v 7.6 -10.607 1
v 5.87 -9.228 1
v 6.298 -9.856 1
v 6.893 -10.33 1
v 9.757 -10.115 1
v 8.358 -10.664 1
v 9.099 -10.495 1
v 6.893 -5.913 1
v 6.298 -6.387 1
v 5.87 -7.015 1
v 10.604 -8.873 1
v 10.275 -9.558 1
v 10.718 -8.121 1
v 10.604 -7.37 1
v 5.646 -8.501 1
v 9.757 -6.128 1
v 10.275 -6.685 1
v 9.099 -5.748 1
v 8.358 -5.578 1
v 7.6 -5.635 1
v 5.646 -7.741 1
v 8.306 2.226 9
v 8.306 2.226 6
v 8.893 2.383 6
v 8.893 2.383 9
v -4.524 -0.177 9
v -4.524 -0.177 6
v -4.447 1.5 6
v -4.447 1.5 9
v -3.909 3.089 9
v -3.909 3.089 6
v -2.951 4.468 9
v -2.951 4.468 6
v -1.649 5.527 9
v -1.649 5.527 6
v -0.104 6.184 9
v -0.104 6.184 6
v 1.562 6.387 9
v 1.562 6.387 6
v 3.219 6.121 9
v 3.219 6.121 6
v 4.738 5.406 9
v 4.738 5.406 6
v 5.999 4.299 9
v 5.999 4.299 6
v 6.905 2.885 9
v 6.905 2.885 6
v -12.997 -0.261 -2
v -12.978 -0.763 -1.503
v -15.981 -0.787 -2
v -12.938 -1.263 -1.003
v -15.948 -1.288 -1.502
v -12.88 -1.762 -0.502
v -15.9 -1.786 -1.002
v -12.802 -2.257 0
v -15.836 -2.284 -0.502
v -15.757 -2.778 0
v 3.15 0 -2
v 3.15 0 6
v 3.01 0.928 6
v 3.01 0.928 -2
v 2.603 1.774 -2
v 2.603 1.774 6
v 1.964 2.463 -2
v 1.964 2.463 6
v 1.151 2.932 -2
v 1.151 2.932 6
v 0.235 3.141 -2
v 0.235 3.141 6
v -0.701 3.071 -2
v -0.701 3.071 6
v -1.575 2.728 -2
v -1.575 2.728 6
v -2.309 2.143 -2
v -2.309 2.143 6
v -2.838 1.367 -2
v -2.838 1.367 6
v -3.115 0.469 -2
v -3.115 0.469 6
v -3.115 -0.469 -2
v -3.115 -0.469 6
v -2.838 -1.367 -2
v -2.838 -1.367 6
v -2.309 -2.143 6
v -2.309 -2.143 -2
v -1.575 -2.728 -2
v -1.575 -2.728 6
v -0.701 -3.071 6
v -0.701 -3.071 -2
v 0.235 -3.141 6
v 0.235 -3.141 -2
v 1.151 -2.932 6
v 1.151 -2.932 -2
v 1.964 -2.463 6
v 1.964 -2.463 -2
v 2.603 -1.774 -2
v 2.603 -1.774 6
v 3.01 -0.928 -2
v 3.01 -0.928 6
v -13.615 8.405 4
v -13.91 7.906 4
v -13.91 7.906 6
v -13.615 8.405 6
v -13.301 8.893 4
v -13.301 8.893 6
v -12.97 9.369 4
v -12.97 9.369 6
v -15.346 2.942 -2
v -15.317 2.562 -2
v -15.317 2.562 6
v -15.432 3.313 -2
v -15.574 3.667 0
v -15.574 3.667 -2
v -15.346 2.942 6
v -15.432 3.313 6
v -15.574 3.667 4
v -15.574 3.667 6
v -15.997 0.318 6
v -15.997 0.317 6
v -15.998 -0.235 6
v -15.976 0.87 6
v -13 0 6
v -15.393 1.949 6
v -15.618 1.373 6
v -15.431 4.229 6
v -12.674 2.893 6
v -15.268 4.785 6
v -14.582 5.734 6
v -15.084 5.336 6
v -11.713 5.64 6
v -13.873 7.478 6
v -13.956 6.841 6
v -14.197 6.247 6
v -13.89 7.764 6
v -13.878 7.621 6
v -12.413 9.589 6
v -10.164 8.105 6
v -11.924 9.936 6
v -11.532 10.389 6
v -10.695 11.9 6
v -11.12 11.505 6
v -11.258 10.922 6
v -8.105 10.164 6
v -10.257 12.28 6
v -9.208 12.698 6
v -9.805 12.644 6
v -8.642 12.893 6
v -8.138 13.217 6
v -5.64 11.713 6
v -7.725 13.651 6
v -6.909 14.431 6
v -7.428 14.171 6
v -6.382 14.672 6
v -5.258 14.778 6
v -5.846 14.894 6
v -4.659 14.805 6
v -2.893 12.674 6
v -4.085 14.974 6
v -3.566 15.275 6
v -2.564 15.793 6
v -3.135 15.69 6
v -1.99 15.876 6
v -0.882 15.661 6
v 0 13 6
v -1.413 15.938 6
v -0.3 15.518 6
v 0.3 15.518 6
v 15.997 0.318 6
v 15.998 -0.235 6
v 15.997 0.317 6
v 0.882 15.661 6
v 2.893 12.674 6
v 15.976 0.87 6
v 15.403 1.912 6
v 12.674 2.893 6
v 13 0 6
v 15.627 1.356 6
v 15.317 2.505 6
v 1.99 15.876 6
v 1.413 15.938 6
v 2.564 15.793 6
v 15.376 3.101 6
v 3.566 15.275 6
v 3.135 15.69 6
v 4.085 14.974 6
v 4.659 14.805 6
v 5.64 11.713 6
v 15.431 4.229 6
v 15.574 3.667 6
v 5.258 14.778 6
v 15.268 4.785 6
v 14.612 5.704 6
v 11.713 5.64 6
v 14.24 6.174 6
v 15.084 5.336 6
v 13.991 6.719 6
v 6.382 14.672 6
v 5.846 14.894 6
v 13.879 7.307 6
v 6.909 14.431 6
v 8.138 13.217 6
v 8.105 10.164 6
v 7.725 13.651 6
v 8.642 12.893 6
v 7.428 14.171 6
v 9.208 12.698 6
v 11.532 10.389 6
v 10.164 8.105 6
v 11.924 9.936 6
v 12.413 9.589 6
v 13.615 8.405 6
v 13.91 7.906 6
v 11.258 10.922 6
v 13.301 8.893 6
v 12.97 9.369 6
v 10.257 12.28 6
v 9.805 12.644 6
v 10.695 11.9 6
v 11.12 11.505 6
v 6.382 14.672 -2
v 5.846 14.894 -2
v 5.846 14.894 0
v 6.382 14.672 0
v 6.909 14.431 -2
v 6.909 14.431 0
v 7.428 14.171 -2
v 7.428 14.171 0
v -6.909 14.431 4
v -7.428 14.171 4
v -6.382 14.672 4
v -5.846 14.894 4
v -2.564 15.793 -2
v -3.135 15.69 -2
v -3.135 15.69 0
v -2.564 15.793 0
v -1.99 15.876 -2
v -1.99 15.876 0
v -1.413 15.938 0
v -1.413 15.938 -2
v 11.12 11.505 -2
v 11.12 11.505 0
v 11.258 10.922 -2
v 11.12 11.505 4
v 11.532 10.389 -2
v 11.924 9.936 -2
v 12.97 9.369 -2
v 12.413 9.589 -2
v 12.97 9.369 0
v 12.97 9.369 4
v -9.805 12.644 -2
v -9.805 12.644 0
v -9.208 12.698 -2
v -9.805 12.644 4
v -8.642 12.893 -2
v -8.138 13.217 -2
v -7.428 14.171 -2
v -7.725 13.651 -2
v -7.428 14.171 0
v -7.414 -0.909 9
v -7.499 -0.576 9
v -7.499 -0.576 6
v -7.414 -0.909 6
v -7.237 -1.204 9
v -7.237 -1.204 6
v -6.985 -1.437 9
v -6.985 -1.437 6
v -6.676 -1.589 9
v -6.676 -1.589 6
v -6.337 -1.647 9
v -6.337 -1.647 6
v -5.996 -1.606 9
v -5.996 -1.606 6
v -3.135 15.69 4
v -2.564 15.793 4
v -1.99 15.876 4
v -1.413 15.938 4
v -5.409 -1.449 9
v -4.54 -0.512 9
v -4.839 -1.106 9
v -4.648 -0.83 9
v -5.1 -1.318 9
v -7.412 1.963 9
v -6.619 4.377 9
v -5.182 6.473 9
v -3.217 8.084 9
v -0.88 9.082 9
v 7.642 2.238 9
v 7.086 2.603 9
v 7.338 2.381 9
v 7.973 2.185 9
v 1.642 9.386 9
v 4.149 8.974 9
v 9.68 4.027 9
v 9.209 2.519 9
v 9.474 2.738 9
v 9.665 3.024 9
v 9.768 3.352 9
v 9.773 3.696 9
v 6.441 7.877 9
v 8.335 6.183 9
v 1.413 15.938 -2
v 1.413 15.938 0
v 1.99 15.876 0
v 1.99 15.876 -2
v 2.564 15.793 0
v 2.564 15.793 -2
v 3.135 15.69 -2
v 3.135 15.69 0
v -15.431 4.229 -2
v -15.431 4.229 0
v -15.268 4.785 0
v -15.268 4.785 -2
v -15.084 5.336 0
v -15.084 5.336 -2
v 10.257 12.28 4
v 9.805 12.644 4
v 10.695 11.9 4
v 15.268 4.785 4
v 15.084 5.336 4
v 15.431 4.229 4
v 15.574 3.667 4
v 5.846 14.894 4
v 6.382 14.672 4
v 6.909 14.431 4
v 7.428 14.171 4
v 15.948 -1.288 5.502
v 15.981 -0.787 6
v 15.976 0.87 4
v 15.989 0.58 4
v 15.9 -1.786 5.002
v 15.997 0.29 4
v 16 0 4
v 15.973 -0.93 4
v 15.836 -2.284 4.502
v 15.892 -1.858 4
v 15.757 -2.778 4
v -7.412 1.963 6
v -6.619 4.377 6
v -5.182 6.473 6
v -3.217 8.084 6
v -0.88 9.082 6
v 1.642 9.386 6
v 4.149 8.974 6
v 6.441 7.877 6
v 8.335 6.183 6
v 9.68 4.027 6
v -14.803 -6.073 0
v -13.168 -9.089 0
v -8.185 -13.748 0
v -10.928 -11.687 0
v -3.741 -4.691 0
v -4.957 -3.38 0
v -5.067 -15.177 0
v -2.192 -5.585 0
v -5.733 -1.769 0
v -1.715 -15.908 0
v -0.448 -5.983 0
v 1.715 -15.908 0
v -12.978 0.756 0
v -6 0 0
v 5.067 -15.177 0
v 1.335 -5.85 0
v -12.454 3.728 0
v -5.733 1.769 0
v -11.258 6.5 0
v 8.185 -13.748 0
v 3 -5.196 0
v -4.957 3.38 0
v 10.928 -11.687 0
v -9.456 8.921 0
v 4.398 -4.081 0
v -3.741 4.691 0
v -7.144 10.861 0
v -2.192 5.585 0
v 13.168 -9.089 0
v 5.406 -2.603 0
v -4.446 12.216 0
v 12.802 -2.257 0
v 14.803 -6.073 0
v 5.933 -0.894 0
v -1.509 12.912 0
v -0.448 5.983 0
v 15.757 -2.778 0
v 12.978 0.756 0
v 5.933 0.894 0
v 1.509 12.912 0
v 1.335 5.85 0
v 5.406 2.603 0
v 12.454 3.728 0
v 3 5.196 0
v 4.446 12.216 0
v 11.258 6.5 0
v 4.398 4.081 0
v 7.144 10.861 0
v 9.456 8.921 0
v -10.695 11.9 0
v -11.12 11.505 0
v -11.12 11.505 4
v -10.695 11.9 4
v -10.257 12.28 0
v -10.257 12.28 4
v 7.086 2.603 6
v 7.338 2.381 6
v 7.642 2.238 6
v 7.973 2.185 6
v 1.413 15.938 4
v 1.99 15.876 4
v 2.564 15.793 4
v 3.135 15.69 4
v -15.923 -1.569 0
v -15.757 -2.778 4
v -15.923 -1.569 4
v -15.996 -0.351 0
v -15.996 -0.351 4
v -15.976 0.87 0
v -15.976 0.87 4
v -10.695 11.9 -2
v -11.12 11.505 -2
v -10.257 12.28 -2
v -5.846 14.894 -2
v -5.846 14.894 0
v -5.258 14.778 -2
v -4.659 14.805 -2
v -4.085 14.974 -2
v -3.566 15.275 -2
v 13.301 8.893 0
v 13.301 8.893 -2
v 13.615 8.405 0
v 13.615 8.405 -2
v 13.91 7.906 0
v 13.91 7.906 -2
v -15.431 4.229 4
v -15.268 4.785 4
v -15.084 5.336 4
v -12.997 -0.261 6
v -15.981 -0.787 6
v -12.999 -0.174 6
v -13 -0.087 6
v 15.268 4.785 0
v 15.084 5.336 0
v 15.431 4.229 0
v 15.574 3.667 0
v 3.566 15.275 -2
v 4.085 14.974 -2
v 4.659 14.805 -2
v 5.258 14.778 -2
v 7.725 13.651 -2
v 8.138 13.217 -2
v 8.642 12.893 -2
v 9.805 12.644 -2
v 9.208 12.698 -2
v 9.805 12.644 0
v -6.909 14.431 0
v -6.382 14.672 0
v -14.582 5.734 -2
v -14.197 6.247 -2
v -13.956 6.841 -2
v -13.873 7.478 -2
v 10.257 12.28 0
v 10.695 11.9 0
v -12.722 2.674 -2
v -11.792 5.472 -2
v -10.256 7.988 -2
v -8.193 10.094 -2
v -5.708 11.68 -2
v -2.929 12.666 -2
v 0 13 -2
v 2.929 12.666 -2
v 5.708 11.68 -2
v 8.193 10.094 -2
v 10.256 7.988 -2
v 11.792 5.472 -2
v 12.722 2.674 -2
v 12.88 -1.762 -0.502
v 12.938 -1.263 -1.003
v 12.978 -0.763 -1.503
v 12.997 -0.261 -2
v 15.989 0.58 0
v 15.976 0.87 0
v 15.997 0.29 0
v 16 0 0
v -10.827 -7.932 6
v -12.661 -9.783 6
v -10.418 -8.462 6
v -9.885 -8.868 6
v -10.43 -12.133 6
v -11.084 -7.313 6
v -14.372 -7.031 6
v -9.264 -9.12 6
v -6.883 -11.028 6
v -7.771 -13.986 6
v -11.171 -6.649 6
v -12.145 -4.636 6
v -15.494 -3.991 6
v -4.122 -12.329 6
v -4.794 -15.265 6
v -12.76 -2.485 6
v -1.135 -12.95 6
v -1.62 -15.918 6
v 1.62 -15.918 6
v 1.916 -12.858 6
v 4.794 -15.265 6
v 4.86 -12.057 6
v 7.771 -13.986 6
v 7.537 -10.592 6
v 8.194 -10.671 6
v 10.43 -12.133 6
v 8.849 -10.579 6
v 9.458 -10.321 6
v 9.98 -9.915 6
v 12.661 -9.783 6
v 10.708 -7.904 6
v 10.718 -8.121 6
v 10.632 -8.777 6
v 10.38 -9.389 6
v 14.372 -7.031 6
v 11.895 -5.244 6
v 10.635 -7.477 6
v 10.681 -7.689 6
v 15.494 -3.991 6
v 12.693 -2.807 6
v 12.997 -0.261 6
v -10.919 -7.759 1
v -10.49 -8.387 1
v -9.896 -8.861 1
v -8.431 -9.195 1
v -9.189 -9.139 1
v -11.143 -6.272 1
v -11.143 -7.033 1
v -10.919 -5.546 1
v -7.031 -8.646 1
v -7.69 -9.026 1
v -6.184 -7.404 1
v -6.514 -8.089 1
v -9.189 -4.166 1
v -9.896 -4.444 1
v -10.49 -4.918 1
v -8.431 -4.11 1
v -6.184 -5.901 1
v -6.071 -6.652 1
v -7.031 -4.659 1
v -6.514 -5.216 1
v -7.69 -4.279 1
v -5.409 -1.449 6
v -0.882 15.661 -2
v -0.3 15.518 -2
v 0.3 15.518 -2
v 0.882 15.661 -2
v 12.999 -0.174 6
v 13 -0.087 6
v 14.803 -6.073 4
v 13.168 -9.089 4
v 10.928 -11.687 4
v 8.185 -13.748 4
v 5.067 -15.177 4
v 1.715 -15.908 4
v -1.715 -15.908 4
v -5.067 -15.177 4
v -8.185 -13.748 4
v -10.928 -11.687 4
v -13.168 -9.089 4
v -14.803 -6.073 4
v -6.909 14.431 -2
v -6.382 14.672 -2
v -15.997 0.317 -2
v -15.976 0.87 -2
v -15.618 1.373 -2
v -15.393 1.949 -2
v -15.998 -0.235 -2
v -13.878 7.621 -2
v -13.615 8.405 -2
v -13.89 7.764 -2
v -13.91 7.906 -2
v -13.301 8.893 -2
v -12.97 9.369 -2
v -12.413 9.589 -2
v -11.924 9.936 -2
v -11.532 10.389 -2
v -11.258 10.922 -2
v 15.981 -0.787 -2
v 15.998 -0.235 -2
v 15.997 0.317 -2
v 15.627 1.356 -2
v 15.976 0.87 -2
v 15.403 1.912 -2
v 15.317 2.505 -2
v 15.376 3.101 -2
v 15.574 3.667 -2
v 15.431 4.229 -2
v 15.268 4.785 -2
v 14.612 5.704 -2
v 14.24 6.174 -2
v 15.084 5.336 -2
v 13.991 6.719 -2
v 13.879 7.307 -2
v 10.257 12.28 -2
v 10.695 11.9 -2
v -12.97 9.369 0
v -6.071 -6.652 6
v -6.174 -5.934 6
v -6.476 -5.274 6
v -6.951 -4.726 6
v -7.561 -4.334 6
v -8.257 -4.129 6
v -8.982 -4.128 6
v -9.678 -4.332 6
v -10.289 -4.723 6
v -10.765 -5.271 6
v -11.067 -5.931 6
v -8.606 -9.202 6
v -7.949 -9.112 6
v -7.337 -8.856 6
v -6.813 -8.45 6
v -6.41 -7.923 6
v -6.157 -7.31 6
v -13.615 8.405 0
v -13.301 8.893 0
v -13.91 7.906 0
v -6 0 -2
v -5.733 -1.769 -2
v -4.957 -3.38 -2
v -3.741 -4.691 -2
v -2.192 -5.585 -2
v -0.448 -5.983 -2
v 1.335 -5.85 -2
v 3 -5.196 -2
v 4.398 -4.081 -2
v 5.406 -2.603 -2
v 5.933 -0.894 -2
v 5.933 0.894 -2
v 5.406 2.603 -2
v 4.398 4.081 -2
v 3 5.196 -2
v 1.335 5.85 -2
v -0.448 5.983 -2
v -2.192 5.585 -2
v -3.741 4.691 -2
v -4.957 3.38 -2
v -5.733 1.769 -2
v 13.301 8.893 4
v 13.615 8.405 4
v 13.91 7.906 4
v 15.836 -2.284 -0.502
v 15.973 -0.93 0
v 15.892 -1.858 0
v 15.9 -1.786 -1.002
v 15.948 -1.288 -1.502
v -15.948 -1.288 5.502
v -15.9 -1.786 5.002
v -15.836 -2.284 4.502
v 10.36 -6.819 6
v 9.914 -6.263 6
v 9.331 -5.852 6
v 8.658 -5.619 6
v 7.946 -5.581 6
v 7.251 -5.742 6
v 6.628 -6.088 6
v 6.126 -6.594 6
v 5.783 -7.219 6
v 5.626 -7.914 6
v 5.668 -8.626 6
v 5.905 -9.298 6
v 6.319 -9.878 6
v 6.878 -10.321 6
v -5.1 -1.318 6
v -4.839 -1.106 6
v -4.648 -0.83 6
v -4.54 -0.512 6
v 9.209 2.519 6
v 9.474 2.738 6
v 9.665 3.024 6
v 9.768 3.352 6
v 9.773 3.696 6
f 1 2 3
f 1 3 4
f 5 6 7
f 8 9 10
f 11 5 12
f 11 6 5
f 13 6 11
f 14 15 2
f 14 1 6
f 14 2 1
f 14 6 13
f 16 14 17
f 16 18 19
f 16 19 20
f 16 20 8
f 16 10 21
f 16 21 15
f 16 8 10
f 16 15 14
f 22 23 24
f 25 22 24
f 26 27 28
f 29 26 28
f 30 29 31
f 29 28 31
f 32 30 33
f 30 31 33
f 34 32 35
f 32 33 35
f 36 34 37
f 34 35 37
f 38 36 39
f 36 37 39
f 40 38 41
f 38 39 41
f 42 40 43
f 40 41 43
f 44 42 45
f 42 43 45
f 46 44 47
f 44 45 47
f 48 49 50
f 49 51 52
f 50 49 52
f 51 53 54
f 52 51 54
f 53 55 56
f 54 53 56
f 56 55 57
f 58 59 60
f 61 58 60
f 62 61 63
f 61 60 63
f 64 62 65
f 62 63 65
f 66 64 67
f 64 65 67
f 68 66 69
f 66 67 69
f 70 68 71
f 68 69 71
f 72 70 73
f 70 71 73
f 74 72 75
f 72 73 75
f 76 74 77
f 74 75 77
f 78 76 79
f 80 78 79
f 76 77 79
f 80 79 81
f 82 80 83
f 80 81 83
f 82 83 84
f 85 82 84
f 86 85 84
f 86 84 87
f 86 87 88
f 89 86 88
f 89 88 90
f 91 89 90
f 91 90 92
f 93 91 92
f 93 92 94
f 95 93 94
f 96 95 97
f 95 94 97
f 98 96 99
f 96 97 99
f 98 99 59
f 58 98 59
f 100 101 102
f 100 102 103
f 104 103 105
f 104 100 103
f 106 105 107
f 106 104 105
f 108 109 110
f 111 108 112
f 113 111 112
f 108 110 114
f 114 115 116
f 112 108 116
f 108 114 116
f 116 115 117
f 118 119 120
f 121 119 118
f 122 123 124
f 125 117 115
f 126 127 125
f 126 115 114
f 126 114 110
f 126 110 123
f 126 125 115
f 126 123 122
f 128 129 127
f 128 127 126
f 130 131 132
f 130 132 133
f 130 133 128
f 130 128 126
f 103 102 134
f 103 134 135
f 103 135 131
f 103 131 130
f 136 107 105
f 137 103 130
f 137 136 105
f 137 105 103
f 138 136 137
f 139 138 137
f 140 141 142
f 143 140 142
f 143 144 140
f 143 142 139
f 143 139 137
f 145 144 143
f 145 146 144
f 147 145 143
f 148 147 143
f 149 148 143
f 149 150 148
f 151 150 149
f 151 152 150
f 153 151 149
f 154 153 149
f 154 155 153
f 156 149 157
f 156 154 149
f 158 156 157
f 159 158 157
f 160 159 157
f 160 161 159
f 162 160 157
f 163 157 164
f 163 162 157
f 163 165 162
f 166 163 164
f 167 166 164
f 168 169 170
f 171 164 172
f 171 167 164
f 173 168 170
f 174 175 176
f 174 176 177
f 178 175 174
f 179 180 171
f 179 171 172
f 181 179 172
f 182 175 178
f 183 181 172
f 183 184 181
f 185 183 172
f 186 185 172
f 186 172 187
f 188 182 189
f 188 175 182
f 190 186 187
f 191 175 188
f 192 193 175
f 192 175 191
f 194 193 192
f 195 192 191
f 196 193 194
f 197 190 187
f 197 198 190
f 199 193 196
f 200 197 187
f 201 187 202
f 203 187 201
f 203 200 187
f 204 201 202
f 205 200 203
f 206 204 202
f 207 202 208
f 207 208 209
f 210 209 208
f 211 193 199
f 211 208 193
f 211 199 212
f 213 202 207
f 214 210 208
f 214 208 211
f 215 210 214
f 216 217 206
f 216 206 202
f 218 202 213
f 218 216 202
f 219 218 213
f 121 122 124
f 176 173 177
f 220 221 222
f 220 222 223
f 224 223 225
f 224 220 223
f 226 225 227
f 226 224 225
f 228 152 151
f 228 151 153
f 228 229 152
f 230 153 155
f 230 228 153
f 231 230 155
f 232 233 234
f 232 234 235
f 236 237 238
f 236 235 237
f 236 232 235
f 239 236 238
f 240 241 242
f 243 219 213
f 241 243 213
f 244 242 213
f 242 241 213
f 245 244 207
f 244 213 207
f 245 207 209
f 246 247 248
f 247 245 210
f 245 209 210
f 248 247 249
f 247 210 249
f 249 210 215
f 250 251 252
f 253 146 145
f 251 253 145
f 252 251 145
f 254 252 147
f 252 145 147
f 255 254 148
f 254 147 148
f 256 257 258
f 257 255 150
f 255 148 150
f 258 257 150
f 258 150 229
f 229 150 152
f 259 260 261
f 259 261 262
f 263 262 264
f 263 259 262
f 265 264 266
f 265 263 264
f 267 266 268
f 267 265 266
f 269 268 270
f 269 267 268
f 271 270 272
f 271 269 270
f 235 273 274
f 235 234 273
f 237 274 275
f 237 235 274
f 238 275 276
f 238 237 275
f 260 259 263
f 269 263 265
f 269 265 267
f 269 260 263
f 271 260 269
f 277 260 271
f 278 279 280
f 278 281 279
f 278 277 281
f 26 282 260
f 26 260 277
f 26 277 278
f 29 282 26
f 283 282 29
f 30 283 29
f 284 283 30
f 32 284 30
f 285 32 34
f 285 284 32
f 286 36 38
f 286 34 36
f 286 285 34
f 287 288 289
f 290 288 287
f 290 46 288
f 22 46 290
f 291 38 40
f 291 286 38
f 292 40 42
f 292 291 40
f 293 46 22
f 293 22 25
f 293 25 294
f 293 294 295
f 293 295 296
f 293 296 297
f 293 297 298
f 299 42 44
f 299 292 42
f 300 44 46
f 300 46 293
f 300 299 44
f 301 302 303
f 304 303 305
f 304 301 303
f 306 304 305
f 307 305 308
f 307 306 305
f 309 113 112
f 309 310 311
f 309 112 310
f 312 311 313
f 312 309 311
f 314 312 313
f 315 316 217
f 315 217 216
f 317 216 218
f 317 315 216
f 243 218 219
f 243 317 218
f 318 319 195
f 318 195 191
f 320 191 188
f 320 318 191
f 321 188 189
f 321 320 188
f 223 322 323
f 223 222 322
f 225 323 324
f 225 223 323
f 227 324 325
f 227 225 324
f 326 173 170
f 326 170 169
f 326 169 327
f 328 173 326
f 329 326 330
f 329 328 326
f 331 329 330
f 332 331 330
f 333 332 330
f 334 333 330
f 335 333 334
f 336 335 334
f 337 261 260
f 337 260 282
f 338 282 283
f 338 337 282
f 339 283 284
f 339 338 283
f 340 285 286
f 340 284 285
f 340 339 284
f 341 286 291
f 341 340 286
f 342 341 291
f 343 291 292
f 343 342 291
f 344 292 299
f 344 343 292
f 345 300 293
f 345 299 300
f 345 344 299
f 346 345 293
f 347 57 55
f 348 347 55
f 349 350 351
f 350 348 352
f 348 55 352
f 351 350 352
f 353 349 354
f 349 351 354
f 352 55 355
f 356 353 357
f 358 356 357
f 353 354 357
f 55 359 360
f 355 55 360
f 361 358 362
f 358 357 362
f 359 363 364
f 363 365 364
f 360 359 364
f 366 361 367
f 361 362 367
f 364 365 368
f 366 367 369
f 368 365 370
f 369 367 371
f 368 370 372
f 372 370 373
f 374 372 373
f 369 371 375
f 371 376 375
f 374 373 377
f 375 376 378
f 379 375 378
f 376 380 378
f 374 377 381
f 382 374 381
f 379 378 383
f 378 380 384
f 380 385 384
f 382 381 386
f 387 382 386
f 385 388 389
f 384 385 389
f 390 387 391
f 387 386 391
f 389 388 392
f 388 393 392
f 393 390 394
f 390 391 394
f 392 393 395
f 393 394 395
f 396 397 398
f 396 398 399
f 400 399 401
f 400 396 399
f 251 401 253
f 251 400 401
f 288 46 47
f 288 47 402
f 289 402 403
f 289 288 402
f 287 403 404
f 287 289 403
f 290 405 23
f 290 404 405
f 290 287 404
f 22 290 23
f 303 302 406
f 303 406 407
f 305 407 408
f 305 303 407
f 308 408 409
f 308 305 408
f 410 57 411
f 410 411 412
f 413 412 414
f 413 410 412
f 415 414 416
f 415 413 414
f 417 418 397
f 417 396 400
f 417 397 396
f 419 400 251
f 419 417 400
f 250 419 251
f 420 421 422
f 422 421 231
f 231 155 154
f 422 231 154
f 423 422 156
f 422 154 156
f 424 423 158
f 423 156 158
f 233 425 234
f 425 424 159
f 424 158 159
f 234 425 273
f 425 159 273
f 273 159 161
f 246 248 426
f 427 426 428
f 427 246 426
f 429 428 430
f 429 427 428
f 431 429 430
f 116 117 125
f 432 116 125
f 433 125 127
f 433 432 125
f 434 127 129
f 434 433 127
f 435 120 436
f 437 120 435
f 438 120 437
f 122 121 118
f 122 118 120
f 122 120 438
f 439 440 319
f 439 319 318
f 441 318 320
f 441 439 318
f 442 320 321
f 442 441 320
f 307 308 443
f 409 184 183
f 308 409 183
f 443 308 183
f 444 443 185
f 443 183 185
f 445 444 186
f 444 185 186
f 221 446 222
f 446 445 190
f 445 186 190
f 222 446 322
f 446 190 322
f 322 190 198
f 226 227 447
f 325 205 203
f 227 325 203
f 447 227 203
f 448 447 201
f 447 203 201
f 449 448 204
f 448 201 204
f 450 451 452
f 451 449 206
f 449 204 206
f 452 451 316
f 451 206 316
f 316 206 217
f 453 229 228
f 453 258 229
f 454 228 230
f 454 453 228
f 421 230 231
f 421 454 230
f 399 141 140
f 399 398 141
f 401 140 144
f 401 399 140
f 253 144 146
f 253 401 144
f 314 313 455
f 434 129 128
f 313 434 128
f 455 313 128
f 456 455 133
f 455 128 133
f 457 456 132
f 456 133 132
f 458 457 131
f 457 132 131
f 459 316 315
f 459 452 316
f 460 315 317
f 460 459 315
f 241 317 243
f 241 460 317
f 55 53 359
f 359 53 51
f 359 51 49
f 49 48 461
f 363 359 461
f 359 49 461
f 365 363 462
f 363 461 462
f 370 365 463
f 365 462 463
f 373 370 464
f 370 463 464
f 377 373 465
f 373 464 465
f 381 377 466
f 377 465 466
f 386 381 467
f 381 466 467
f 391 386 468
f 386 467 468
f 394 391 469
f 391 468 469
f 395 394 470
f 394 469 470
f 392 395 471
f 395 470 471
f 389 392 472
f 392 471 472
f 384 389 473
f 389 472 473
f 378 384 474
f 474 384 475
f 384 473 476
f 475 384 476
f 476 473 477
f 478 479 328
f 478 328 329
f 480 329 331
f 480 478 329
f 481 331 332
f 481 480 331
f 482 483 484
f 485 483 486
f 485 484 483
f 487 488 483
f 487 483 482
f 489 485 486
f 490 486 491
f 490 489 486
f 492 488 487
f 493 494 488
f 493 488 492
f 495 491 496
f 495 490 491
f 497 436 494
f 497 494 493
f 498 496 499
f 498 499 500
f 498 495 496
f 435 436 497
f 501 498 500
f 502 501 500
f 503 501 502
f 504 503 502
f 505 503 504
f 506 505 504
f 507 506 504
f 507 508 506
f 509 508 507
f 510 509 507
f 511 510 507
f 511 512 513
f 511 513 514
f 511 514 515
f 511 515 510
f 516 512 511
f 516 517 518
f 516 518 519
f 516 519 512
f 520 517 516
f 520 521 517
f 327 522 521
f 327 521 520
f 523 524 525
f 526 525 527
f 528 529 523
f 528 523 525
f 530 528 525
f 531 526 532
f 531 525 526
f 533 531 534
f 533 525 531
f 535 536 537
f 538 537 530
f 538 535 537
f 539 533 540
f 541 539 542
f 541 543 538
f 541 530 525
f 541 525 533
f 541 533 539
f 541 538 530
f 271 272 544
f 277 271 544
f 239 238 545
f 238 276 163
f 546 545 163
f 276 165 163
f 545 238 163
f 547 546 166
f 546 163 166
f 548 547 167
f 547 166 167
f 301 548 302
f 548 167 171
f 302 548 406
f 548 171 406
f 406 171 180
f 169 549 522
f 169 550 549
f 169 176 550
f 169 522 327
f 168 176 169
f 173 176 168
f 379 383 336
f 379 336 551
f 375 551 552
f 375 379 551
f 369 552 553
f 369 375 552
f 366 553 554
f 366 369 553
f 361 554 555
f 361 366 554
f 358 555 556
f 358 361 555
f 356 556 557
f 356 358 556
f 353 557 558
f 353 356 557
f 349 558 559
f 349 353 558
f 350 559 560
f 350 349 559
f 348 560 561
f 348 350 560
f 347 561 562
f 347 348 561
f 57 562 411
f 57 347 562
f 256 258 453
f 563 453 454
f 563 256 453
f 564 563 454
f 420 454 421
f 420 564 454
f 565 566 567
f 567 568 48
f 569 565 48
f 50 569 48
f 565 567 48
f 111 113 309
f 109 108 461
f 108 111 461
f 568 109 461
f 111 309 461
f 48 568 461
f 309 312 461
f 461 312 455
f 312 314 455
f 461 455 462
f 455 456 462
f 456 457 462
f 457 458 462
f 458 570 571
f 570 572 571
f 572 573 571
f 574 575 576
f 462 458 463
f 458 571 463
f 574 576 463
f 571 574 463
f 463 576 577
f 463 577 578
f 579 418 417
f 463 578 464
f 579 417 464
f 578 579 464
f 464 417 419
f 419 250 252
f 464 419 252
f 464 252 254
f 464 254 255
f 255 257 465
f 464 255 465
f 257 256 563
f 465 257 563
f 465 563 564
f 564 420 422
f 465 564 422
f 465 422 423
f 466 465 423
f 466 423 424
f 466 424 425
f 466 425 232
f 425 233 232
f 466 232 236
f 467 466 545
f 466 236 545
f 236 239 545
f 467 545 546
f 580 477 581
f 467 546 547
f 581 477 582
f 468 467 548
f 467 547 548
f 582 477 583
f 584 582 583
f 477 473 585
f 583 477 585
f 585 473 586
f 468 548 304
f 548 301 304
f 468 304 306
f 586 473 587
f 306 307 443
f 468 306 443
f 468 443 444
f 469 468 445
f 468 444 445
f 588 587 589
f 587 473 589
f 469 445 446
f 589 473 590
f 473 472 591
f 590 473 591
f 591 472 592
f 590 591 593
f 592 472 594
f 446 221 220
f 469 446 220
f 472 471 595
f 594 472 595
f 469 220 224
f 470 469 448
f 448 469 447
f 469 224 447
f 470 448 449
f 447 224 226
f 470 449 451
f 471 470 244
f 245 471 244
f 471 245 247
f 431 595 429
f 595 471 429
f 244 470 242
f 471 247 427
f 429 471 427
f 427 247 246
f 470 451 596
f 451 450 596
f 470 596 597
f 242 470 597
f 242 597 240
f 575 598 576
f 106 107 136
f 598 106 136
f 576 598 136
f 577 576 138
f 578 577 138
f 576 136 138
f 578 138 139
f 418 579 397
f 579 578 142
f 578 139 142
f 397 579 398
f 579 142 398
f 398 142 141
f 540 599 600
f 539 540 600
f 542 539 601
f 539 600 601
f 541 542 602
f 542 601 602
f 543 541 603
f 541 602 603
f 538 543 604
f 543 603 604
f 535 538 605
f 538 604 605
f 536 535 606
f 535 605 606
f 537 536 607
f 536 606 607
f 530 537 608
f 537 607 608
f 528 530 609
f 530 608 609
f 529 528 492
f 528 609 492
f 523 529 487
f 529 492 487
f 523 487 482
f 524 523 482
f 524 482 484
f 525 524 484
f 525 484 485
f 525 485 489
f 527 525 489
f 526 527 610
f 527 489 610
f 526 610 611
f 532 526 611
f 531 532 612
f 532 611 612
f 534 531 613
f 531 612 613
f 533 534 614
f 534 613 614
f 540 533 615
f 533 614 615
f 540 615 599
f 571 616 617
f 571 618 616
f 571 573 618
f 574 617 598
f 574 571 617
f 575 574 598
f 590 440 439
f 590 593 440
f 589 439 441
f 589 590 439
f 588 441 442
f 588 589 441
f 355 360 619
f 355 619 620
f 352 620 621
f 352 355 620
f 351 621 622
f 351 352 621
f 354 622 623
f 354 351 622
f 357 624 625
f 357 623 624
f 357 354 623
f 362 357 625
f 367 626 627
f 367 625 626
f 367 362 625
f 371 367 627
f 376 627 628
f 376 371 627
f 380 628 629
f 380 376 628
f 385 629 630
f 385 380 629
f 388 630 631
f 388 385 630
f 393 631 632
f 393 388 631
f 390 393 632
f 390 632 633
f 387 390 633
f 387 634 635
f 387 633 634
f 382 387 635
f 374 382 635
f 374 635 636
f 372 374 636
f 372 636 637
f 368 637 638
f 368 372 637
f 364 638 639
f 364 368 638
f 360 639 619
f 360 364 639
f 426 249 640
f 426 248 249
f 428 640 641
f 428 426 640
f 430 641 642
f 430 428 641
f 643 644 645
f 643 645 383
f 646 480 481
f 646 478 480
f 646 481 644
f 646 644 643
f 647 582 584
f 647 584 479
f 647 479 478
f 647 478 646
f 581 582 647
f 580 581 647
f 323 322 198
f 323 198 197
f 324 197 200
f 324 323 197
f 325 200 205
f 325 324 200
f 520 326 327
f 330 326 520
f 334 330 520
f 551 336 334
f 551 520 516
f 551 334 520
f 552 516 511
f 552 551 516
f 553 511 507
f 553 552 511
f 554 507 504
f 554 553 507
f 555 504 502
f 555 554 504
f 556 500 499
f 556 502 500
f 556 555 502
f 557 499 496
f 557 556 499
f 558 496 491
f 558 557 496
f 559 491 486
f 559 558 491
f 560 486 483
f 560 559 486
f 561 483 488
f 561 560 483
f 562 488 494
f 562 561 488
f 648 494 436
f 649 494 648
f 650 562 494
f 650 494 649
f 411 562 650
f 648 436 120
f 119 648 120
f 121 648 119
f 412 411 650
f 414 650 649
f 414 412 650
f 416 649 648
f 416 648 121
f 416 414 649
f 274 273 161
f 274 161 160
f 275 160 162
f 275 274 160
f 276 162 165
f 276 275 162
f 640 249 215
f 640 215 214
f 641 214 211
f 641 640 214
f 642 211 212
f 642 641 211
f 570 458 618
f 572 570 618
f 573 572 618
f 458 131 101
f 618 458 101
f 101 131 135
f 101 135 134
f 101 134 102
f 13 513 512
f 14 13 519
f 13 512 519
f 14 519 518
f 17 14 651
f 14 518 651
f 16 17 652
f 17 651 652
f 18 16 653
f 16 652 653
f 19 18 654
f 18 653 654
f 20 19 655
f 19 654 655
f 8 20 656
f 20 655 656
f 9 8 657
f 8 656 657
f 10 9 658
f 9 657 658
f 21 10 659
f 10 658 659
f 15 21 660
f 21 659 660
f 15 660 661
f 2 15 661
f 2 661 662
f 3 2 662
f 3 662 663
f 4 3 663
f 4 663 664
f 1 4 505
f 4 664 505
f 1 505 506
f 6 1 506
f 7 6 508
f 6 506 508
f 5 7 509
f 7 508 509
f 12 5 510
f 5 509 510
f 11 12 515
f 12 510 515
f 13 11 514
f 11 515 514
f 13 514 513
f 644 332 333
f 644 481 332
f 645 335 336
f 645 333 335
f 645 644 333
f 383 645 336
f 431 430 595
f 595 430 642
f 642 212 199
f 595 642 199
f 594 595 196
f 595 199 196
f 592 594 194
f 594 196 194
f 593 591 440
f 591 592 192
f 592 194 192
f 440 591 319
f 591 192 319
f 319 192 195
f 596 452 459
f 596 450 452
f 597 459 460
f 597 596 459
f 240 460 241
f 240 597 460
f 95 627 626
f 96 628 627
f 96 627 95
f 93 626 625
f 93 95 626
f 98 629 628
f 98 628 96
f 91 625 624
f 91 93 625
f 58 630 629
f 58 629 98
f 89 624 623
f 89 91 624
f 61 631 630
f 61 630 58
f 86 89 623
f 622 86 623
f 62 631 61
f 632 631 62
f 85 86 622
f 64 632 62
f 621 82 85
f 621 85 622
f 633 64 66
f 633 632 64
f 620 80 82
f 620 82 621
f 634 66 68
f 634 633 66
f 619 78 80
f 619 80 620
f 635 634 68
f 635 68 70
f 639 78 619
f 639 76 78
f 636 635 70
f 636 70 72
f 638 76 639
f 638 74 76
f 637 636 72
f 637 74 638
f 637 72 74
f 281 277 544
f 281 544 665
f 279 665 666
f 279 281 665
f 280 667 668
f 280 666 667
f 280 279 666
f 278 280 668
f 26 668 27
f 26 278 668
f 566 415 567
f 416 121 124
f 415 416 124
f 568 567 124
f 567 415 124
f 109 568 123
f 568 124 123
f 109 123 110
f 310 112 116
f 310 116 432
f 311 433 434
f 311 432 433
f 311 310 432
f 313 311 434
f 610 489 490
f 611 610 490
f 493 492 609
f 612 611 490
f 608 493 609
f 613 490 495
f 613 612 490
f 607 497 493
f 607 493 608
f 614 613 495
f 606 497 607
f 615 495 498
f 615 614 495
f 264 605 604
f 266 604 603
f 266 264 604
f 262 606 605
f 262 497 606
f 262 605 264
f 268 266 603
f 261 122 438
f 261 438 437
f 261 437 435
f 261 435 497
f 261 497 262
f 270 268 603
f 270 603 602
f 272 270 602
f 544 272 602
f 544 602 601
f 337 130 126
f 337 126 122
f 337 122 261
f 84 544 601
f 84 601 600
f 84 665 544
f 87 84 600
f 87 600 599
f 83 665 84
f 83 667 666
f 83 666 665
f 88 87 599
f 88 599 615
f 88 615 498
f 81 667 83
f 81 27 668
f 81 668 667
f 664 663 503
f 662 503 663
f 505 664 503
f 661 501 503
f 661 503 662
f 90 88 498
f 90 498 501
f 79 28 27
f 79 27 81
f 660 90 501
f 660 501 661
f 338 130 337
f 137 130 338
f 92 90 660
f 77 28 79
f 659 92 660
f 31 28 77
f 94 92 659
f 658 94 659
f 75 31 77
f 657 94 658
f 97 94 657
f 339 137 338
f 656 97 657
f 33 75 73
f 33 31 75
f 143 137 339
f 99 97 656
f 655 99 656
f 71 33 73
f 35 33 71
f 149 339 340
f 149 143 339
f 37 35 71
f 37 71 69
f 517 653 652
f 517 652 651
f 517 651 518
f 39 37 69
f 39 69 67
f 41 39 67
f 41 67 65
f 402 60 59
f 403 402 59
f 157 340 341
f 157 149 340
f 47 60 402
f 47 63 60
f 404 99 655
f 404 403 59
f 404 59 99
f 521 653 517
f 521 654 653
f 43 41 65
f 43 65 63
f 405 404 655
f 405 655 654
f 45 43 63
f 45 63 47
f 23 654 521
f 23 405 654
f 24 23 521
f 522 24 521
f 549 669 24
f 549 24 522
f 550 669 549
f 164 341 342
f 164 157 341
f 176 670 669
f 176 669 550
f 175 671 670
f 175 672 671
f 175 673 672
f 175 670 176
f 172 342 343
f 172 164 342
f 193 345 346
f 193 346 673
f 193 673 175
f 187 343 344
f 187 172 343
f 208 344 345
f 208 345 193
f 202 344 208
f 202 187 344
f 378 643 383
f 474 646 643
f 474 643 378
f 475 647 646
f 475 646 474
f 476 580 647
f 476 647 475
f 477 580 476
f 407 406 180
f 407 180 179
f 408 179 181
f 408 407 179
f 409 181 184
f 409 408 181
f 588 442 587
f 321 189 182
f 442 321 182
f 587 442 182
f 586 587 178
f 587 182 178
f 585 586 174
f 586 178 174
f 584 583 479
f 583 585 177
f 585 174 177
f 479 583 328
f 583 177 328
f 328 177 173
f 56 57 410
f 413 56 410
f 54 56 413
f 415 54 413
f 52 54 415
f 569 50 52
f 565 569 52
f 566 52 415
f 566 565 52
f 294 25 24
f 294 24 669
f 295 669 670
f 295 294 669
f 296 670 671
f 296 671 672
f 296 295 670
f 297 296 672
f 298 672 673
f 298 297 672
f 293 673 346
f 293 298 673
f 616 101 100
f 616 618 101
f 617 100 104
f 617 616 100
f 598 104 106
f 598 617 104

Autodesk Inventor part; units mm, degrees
ref_plane "YZ Plane" through (0, 0, 0) normal (1, 0, 0) x (0, 1, 0)
ref_plane "XZ Plane" through (0, 0, 0) normal (0, 1, 0) x (-1, 0, 0)
ref_plane "XY Plane" through (0, 0, 0) normal (0, 0, 1) x (1, 0, 0)
sketch "Sketch1" plane through (0, 0, 0) normal (0, 0, 1) x (1, 0, 0)
  circle A0 centre (0, 0) radius 16
  dimension "d0" = 32
extrude "Extrusion1" add sketch "Sketch1" along normal blind 4
sketch "Sketch2" plane through (0, 0, 4) normal (0, 0, 1) x (1, 0, 0)
  circle A0 centre (0, 0) radius 16 projected
  arc A1 (15.7569, -2.7784) -> (-15.7569, -2.7784) centre (0, 0) ccw
  line L0 (0, 0) -> (-15.7569, -2.7784) construction
  line L1 (0, 0) -> (16, 0) construction
  line L2 (0, 0) -> (15.7569, -2.7784) construction
  arc A2 (12.8025, -2.2574) -> (-12.8025, -2.2574) centre (0, 0) ccw
  line L3 (0, 0) -> (-12.8025, -2.2574) construction
  line L4 (0, 0) -> (13, 0) construction
  line L5 (0, 0) -> (12.8025, -2.2574) construction
  line L6 (-12.8025, -2.2574) -> (-15.7569, -2.7784)
  line L7 (12.8025, -2.2574) -> (15.7569, -2.7784)
  dimension "d3" = 170
  dimension "d4" = 160
  dimension "d5" = 13
  dimension "d6" = 170
  dimension "d7" = 160
extrude "Extrusion2" add sketch "Sketch2" along normal blind 2 and the other way blind 6 contours A0 L7 A2 L6 picked at (-14.8428, -1.3464)
sketch "Sketch3" plane through (0, 0, 6) normal (0, 0, 1) x (1, 0, 0)
  arc A0 (15.7569, -2.7784) -> (-15.7569, -2.7784) centre (0, 0) ccw projected
  line L0 (0, 16) -> (0, 18)
  circle A1 centre (0, 18) radius 2.5
  line L1 (-4.5077, 15.3519) -> (-5.0712, 17.2709)
  circle A2 centre (-5.0712, 17.2709) radius 2.5
  line L2 (-8.6503, 13.4601) -> (-9.7315, 15.1426)
  circle A3 centre (-9.7315, 15.1426) radius 2.5
  line L3 (-12.092, 10.4778) -> (-13.6035, 11.7875)
  circle A4 centre (-13.6035, 11.7875) radius 2.5
  line L4 (-14.5541, 6.6466) -> (-16.3734, 7.4775)
  circle A5 centre (-16.3734, 7.4775) radius 2.5
  line L5 (-15.8371, 2.277) -> (-17.8168, 2.5617)
  circle A6 centre (-17.8168, 2.5617) radius 2.5
  line L6 (-15.8371, -2.277) -> (-17.8168, -2.5617)
  circle A7 centre (-17.8168, -2.5617) radius 2.5
  line L7 (-14.5541, -6.6466) -> (-16.3734, -7.4775)
  circle A8 centre (-16.3734, -7.4775) radius 2.5
  line L8 (-12.092, -10.4778) -> (-13.6035, -11.7875)
  circle A9 centre (-13.6035, -11.7875) radius 2.5
  line L9 (-8.6503, -13.4601) -> (-9.7315, -15.1426)
  circle A10 centre (-9.7315, -15.1426) radius 2.5
  line L10 (-4.5077, -15.3519) -> (-5.0712, -17.2709)
  circle A11 centre (-5.0712, -17.2709) radius 2.5
  line L11 (0, -16) -> (0, -18)
  circle A12 centre (0, -18) radius 2.5
  line L12 (4.5077, -15.3519) -> (5.0712, -17.2709)
  circle A13 centre (5.0712, -17.2709) radius 2.5
  line L13 (8.6503, -13.4601) -> (9.7315, -15.1426)
  circle A14 centre (9.7315, -15.1426) radius 2.5
  line L14 (12.092, -10.4778) -> (13.6035, -11.7875)
  circle A15 centre (13.6035, -11.7875) radius 2.5
  line L15 (14.5541, -6.6466) -> (16.3734, -7.4775)
  circle A16 centre (16.3734, -7.4775) radius 2.5
  line L16 (15.8371, -2.277) -> (17.8168, -2.5617)
  circle A17 centre (17.8168, -2.5617) radius 2.5
  line L17 (15.8371, 2.277) -> (17.8168, 2.5617)
  circle A18 centre (17.8168, 2.5617) radius 2.5
  line L18 (14.5541, 6.6466) -> (16.3734, 7.4775)
  circle A19 centre (16.3734, 7.4775) radius 2.5
  line L19 (12.092, 10.4778) -> (13.6035, 11.7875)
  circle A20 centre (13.6035, 11.7875) radius 2.5
  line L20 (8.6503, 13.4601) -> (9.7315, 15.1426)
  circle A21 centre (9.7315, 15.1426) radius 2.5
  line L21 (4.5077, 15.3519) -> (5.0712, 17.2709)
  circle A22 centre (5.0712, 17.2709) radius 2.5
  dimension "d12" = 2
  dimension "d13" = 5
  dimension "d16" = 360
extrude "Extrusion3" cut sketch "Sketch3" against normal blind 9.25 contours A6 A0 | A0 A6 | A5 A0 | A0 A5 | A4 A0 | A0 A4 | A3 A0 | A0 A3 | A2 A0 | A0 A2 | A1 A0 | A0 A1 | A22 A0 | A0 A22 | A21 A0 | A0 A21 | A20 A0 | A0 A20 | A19 A0 | A0 A19 | A18 A0 | A0 A18
sketch "Sketch4" plane through (0, 0, 4) normal (0, 0, 1) x (1, 0, 0)
  circle A0 centre (0, 0) radius 3.05
  dimension "d20" = 6.1
extrude "Extrusion4" cut sketch "Sketch4" along normal blind 9.25 and the other way blind 8.875
chamfer "Chamfer1" distance 2 angle 45 4 edges at (-14.2797, -2.5179, 6) (-14.2797, -2.5179, -2) (14.2797, -2.5179, 6) (14.2797, -2.5179, -2)
sketch "Sketch5" plane through (0, 0, 4) normal (0, 0, 1) x (1, 0, 0)
  line L0 (0, 0) -> (12.557, 3.3646)
  arc A0 (12.9974, -0.2609) -> (-12.9974, -0.2609) centre (0, 0) ccw projected
  line L1 (0, 0) -> (13, 0) construction
  line L2 (0, 0) -> (2.8978, 0.7765)
  circle A1 centre (0, 0) radius 3.05 projected
  line L3 (0, 0) -> (1.4489, 0.3882)
  arc A2 (7.2444, 1.9411) -> (-4.3467, -1.1647) centre (1.4489, 0.3882) ccw
  line L4 (1.4489, 0.3882) -> (7.2444, 1.9411) construction
  line L5 (1.4489, 0.3882) -> (-4.3467, -1.1647) construction
  arc A3 (10.1422, 2.7176) -> (-7.2444, -1.9411) centre (1.4489, 0.3882) ccw
  line L6 (-7.2444, -1.9411) -> (-4.3467, -1.1647)
  line L7 (7.2444, 1.9411) -> (10.1422, 2.7176)
  dimension "d26" = 15
  dimension "d33" = 1.5
  dimension "d34" = 6
  dimension "d35" = 180
  dimension "d36" = 9
extrude "Extrusion5" add sketch "Sketch5" along normal blind 5 contours A2 L6 A3 L0
sketch "Sketch6" plane through (0, 0, 0) normal (0, 0, -1) x (-1, 0, 0)
  circle A0 centre (0, 0) radius 3
  circle A1 centre (0, 0) radius 6
  dimension "d38" = 12
extrude "Extrusion6" add sketch "Sketch6" along normal blind 2
sketch "Sketch7" plane through (0, 0, 4) normal (0, 0, 1) x (1, 0, 0)
  arc A0 (-15.9763, 0.8697) -> (-15.9806, -0.787) centre (0, 0) ccw projected
  arc A1 (15.9806, -0.787) -> (15.9763, 0.8697) centre (0, 0) ccw projected
  arc A2 (-15.9763, 0.8697) -> (15.9806, -0.787) centre (0, 0) ccw
  arc A3 (12.9974, -0.2609) -> (-12.9974, -0.2609) centre (0, 0) ccw projected
  arc A4 (-13, 0) -> (13, 0) centre (0, 0) ccw
  line L0 (0, 0) -> (13, 0) construction
  line L1 (0, 0) -> (-13, 0) construction
  line L2 (-15.9763, 0.8697) -> (-13, 0)
  line L3 (13, 0) -> (15.9763, 0.8697)
  dimension "d41" = 13
  dimension "d42" = 180
extrude "Extrusion7" add sketch "Sketch7" along normal blind 2 contours L2 A3 A4 L3 A1 A2 A0
sketch "Sketch12" plane through (0, 0, 4) normal (0, 0, 1) x (1, 0, 0)
  circle A0 centre (0, 0) radius 13
extrude "Extrusion11" add sketch "Sketch12" along normal blind 2
sketch "Sketch8" plane through (0, 0, 0) normal (0, 0, -1) x (-1, 0, 0)
  arc A0 (-6.62, -8.785) -> (7.502, -8.0449) centre (0, 0) ccw
  line L0 (0, 0) -> (-6.62, -8.785) construction
  line L1 (0, 0) -> (11, 0) construction
  line L2 (0, 0) -> (7.502, -8.0449) construction
  circle A1 centre (-6.62, -8.785) radius 2.5
  circle A2 centre (7.502, -8.0449) radius 2.5
  dimension "d45" = 11
  dimension "d46" = 127
  dimension "d47" = 80
  dimension "d48" = 5
  dimension "d49" = 5
extrude "Extrusion8" [suppressed]
sketch "Sketch13" plane through (0, 0, 6) normal (0, 0, 1) x (1, 0, 0)
  circle A0 centre (0, 0) radius 3.15
  dimension "d72" = 6.3
extrude "Extrusion12" cut sketch "Sketch13" against normal blind 10.25
sketch "Sketch14" plane through (0, 0, 6) normal (0, 0, 1) x (1, 0, 0)
  point P0 (0, 0)
sketch "Sketch15" plane through (0, 0, 6) normal (0, 0, 1) x (1, 0, 0)
  arc A0 (-8.6212, -6.6525) -> (8.1676, -8.1213) centre (0.3894, -0.3431) ccw
  line L0 (0.3894, -0.3431) -> (-8.6212, -6.6525) construction
  line L1 (0.3894, -0.3431) -> (11.3894, -0.3431) construction
  line L2 (0.3894, -0.3431) -> (8.1676, -8.1213) construction
  circle A1 centre (-8.6212, -6.6525) radius 2.55
  circle A2 centre (8.1676, -8.1213) radius 2.55
  point P0 (0, 0)
  dimension "d73" = 11
  dimension "d74" = 145
  dimension "d75" = 100
  dimension "d76" = 5.1
  dimension "d77" = 5.1
extrude "Extrusion13" cut sketch "Sketch15" against normal blind 5
fillet "Fillet6" radius 1.2 4 edges at (-7.2444, -1.9411, 7.5) (-4.3467, -1.1647, 7.5) (7.2444, 1.9411, 7.5) (10.1422, 2.7176, 7.5)
sketch "Sketch16" plane through (-8.6212, -6.6525, 1) normal (0, 0, 1) x (1, 0, 0)
  circle A0 centre (0, 0) radius 1
  circle A1 centre (16.7888, -1.4688) radius 2.55 projected
  circle A2 centre (16.7888, -1.4688) radius 1
  point P0 (8.6212, 6.6525)
  dimension "d84" = 2
  dimension "d85" = 2
extrude "Extrusion14" [suppressed]
sketch "Sketch18" plane through (0, 0, 6) normal (0, 0, 1) x (1, 0, 0)
  arc A0 (-1.4128, 15.9375) -> (-3.1345, 15.69) centre (0, 0) ccw projected
  line L0 (-3.1345, 15.69) -> (-2.0992, 19.5537)
  line L1 (-3.1345, 15.69) -> (0.8655, 15.69) construction
  arc A1 (3.1345, 15.69) -> (1.4128, 15.9375) centre (0, 0) ccw projected
  arc A2 (3.1345, 15.69) -> (5.8457, 14.8939) centre (5.0712, 17.2709) ccw projected
  line L2 (3.1345, 15.69) -> (2.0992, 19.5537)
  line L3 (3.1345, 15.69) -> (7.1345, 15.69) construction
  line L4 (2.0992, 19.5537) -> (-2.0992, 19.5537)
  arc A3 (-5.8457, 14.8939) -> (-3.1345, 15.69) centre (-5.0712, 17.2709) ccw projected
  line L5 (-3.1345, 15.69) -> (0, 14.2283)
  line L6 (-3.1345, 15.69) -> (0.324, 15.69) construction
  line L7 (0, 14.2283) -> (3.1345, 15.69)
  dimension "d94" = 4
  dimension "d95" = 75
  dimension "d96" = 4
  dimension "d97" = 105
  dimension "d98" = 25
extrude "Extrusion16" [suppressed]
fillet "Fillet11" [suppressed]
sketch "Sketch20" plane through (0, 0, 6) normal (0, 0, 1) x (1, 0, 0)
  line L0 (-0.1809, 19.5537) -> (0.1809, 19.5537) projected
  arc A0 (-0.1809, 19.5537) -> (-2.5957, 17.7007) centre (-0.1809, 17.0537) ccw projected
  arc A1 (2.5957, 17.7007) -> (0.1809, 19.5537) centre (0.1809, 17.0537) ccw projected
  line L1 (-2.8685, 16.6827) -> (-2.5957, 17.7007) projected
  line L2 (2.5957, 17.7007) -> (2.8685, 16.6827) projected
  line L3 (-1.1298, 16.2169) -> (-0.8571, 17.2348)
  arc A2 (-0.1809, 17.7537) -> (-0.8571, 17.2348) centre (-0.1809, 17.0537) ccw
  line L4 (-0.1809, 17.7537) -> (0.1809, 17.7537)
  arc A3 (0.8571, 17.2348) -> (0.1809, 17.7537) centre (0.1809, 17.0537) ccw
  line L5 (0.8571, 17.2348) -> (1.1298, 16.2169)
  line L6 (-1.1298, 16.2169) -> (-1.6475, 14.285)
  line L7 (-1.6475, 14.285) -> (1.6475, 14.285)
  line L8 (1.6475, 14.285) -> (1.1298, 16.2169)
  point P0 (0, 0)
  dimension "d112" = 1.8
  dimension "d113" = 2
extrude "Extrusion18" [suppressed]
fillet "Fillet12" [suppressed]
properties part number "knob"
